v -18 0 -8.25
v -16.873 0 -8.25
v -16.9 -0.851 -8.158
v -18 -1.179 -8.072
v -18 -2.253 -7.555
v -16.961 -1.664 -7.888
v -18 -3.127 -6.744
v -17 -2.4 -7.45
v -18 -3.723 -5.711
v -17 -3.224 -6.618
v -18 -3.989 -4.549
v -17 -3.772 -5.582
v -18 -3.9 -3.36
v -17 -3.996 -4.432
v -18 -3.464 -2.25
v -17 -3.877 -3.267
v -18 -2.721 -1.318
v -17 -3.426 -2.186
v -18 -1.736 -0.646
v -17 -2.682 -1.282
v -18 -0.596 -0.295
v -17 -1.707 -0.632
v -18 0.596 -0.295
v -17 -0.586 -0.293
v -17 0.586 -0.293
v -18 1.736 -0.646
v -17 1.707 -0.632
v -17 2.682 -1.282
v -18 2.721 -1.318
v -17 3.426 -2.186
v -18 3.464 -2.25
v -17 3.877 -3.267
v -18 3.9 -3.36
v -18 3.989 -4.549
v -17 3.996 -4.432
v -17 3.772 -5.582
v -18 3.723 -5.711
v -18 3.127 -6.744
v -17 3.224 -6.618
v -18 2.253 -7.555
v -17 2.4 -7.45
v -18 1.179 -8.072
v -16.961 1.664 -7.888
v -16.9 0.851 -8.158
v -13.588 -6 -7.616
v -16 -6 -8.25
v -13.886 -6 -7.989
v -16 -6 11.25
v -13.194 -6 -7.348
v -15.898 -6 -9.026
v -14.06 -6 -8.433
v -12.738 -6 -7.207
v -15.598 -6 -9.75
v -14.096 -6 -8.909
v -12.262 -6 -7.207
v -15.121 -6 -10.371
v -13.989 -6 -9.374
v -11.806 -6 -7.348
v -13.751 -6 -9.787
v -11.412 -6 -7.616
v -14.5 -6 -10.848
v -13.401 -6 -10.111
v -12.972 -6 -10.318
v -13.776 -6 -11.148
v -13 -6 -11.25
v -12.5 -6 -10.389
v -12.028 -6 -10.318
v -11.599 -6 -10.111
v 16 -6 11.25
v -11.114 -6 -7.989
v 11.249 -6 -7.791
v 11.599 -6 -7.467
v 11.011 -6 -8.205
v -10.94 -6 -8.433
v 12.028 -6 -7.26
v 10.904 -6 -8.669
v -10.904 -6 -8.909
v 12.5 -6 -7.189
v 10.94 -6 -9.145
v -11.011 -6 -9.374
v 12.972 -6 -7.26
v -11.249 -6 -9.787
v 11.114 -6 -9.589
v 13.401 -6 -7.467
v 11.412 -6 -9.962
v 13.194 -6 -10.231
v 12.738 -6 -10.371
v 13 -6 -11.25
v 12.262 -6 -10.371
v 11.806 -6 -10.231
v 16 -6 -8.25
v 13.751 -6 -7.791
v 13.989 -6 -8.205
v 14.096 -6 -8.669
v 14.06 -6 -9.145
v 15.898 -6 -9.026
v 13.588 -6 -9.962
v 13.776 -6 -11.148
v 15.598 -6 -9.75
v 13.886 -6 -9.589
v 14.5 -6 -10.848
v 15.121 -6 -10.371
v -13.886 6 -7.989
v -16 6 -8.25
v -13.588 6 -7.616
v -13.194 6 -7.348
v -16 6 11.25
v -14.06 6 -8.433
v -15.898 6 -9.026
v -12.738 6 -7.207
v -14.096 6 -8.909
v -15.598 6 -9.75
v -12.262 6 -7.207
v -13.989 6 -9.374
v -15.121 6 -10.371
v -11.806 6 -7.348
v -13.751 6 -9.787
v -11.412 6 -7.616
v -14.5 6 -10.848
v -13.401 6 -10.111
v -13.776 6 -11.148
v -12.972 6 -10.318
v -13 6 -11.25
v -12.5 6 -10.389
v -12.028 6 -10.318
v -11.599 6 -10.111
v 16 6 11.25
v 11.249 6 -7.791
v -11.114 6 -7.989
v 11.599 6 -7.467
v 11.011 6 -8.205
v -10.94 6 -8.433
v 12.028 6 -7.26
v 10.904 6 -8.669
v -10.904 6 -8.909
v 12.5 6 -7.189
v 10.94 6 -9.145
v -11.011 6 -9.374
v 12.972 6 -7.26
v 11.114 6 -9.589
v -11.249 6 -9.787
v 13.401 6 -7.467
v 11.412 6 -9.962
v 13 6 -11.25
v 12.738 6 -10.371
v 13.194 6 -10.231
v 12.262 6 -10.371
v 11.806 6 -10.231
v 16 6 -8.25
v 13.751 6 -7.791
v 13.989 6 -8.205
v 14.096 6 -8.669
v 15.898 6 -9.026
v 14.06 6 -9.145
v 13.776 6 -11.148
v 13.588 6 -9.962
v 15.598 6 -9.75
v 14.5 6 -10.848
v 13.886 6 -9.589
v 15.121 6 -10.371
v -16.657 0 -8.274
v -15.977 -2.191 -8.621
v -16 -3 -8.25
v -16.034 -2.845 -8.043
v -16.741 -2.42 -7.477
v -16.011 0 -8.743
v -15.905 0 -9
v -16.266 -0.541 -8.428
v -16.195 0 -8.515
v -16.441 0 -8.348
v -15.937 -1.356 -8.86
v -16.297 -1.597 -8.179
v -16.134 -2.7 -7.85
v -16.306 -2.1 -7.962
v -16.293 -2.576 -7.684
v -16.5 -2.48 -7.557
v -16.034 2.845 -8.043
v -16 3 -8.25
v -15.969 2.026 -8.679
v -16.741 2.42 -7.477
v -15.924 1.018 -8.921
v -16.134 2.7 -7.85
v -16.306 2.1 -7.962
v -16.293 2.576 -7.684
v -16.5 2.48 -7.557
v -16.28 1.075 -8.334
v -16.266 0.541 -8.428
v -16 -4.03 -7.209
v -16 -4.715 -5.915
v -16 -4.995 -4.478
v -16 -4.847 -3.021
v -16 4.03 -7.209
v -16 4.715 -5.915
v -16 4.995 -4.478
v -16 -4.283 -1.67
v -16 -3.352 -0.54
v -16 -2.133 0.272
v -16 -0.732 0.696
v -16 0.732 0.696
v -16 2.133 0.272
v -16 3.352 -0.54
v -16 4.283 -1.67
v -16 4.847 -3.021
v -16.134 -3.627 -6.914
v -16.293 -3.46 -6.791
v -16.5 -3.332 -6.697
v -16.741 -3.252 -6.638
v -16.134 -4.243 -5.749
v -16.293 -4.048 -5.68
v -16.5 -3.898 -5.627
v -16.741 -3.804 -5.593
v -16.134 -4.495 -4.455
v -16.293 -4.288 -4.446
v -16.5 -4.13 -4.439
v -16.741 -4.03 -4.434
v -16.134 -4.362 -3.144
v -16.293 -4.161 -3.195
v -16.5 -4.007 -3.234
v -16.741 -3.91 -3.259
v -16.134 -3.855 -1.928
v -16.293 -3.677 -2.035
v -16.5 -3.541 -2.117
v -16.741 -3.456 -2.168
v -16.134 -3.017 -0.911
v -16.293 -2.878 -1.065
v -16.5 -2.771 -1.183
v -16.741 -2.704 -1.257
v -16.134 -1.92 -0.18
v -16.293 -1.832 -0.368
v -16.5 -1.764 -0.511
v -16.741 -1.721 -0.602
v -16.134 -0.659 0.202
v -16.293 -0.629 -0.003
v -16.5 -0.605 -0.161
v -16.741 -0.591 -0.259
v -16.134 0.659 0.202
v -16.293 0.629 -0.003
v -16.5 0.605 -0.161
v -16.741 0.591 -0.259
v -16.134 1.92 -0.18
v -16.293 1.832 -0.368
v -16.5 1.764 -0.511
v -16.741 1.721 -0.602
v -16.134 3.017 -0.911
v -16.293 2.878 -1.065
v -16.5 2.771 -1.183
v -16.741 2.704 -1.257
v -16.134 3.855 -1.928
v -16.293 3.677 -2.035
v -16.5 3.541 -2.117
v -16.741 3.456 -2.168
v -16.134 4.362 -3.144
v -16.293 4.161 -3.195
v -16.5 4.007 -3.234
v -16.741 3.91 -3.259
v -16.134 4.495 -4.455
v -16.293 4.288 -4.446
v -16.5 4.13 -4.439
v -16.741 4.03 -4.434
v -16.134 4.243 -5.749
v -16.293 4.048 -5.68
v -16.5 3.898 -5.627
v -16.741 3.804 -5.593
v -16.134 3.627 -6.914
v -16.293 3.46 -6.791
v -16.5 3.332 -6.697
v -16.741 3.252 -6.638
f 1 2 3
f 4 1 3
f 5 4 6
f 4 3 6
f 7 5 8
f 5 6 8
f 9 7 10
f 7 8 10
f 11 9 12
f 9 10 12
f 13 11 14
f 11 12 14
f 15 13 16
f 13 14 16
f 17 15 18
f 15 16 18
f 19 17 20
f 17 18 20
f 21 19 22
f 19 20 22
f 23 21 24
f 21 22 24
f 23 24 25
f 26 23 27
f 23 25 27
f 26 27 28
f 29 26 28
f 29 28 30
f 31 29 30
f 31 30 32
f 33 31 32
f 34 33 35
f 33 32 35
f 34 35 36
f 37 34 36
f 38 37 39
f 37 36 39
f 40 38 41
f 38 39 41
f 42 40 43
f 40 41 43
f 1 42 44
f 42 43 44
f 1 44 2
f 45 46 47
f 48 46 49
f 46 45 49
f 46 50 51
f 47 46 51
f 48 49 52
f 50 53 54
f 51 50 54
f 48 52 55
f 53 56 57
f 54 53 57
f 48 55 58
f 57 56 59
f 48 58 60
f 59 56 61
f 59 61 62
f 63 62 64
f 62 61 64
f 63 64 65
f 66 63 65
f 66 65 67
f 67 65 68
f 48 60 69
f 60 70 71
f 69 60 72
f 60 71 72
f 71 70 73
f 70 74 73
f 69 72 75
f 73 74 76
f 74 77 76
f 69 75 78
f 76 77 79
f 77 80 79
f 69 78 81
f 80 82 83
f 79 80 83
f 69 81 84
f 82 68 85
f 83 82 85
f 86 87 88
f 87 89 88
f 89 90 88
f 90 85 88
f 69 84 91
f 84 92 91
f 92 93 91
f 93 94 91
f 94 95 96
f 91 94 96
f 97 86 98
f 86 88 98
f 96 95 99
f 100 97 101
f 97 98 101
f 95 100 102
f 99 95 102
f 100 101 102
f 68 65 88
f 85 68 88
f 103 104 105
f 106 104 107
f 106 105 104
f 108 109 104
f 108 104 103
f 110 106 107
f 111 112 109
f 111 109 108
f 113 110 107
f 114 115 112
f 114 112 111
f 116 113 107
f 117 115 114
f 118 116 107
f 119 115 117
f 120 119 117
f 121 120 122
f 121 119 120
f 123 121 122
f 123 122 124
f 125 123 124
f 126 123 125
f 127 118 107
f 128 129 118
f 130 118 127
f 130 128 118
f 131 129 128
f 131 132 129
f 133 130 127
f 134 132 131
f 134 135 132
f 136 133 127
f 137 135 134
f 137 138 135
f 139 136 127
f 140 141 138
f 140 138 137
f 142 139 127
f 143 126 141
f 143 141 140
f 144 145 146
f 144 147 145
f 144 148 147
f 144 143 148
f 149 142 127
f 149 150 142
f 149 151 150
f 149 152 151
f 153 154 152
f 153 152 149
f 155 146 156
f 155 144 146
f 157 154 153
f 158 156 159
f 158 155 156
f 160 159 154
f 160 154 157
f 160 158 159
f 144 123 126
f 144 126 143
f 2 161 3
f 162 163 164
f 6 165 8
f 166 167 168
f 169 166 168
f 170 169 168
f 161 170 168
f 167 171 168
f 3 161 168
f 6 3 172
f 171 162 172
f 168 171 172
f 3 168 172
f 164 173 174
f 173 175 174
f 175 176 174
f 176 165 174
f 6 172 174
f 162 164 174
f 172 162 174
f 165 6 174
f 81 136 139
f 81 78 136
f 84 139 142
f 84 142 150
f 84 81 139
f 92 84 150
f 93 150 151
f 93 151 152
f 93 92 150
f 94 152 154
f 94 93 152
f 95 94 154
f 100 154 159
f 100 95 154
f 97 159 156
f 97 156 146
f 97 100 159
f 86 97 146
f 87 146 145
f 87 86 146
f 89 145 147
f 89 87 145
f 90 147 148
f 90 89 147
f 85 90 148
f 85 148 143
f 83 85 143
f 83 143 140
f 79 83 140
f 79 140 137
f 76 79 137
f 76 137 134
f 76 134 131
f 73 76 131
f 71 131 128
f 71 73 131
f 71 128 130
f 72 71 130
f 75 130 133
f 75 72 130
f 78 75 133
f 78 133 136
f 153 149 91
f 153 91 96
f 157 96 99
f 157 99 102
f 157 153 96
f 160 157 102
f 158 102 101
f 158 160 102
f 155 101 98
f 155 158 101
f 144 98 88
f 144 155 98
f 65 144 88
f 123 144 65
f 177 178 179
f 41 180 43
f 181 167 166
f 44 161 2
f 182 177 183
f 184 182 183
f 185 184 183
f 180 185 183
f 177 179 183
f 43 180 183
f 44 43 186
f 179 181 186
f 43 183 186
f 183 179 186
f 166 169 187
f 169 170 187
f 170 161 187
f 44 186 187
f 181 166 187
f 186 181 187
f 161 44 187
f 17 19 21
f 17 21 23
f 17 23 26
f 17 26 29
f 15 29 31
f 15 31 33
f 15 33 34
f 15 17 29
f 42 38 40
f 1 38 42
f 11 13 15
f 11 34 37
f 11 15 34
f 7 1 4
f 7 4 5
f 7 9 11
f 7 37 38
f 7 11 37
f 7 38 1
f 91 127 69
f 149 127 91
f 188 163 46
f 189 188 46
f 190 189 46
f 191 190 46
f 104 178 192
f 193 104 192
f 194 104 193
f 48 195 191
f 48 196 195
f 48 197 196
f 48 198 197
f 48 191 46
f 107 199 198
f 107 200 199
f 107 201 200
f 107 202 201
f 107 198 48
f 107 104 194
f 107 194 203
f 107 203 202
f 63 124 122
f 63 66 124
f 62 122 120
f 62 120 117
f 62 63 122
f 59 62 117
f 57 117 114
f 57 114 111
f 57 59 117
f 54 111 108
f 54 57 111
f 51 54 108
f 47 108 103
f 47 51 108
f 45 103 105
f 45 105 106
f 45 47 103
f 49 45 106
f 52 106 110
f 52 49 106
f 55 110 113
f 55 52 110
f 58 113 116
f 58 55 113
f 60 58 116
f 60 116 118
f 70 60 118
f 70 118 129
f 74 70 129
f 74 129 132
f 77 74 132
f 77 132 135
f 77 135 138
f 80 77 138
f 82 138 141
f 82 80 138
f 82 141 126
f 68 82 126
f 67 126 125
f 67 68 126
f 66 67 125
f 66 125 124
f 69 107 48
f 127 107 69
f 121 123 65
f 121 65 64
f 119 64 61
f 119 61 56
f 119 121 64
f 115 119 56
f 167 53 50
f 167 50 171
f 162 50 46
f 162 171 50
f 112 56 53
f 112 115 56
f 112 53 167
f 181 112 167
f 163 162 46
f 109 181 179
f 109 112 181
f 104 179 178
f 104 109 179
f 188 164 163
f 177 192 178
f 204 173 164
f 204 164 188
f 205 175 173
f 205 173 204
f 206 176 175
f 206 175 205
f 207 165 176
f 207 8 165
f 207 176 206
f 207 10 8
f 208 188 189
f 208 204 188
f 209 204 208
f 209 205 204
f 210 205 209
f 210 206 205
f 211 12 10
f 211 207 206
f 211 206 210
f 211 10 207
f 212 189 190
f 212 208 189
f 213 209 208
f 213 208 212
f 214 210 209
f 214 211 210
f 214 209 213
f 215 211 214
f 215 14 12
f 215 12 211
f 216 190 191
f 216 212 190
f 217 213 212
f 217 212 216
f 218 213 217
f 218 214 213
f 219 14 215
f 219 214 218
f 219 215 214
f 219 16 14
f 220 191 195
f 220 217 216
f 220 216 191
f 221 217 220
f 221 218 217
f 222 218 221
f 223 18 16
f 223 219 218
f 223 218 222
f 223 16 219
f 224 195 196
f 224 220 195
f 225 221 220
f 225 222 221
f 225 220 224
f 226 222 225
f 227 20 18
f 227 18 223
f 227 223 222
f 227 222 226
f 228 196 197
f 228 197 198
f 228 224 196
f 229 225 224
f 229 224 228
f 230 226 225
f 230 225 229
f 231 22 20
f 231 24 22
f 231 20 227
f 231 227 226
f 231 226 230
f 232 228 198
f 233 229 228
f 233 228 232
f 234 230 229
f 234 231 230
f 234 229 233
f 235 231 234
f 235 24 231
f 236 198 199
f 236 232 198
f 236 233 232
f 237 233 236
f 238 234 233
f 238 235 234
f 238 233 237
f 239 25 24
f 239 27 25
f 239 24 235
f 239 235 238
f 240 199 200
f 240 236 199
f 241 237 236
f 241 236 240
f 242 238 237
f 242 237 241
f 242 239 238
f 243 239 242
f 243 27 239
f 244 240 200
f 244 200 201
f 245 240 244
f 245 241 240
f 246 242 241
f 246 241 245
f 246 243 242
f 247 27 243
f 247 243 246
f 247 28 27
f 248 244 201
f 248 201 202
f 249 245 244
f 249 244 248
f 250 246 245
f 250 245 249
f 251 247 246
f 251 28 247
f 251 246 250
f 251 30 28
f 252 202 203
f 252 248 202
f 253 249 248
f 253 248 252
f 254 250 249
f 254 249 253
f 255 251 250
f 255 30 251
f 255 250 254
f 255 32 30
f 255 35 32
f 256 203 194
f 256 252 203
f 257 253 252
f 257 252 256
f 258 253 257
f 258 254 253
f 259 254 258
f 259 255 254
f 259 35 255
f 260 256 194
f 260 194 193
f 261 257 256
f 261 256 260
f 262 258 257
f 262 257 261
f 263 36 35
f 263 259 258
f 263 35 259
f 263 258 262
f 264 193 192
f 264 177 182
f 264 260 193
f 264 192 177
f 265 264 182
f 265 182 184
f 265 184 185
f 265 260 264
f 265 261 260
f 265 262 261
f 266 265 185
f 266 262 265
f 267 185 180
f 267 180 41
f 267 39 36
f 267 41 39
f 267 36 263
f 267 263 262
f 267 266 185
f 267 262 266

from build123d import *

# Parameters (mm, degrees)
SKETCH_1_R      = 1.6
EXTRUDE_1_DEPTH = 6
SKETCH_2_R      = 4
EXTRUDE_2_DEPTH = 2
FILLET_1_R      = 1


with BuildPart() as part:
    # 草图1 → 凸台-拉伸1 (new, symmetric)
    with BuildSketch(Plane(origin=(0, 0, 0), x_dir=(1, 0, 0), z_dir=(0, 1, 0))):
        with BuildLine():
            Line((-16, -11.25), (16, -11.25))
            Line((16, -11.25), (16, 8.25))
            ThreePointArc((16, 8.25), (15.121320344, 10.371320344), (13, 11.25))
            Line((13, 11.25), (-13, 11.25))
            ThreePointArc((-13, 11.25), (-15.121320344, 10.371320344), (-16, 8.25))
            Line((-16, 8.25), (-16, -11.25))
        make_face()
        with Locations(Location((12.5, 8.7890625, 0), (0, 0, 270))):
            Circle(SKETCH_1_R, mode=Mode.SUBTRACT)
        with Locations(Location((-12.5, 8.7890625, 0), (0, 0, 90))):
            Circle(SKETCH_1_R, mode=Mode.SUBTRACT)
    extrude(amount=EXTRUDE_1_DEPTH, both=True)

    # 草图2 → 凸台-拉伸2 (add)
    with BuildSketch(Plane.ZY.offset(16)):
        with Locations(Location((-4.25, 0, 0), (0, 0, 180))):
            Circle(SKETCH_2_R)
    extrude(amount=EXTRUDE_2_DEPTH)

    # 圆角1
    fillet_1_edges = [part.edges().sort_by_distance(p)[0] for p in [
        (-16, 0, -0.25),
    ]]
    fillet(fillet_1_edges, radius=FILLET_1_R)


solid = part.part
